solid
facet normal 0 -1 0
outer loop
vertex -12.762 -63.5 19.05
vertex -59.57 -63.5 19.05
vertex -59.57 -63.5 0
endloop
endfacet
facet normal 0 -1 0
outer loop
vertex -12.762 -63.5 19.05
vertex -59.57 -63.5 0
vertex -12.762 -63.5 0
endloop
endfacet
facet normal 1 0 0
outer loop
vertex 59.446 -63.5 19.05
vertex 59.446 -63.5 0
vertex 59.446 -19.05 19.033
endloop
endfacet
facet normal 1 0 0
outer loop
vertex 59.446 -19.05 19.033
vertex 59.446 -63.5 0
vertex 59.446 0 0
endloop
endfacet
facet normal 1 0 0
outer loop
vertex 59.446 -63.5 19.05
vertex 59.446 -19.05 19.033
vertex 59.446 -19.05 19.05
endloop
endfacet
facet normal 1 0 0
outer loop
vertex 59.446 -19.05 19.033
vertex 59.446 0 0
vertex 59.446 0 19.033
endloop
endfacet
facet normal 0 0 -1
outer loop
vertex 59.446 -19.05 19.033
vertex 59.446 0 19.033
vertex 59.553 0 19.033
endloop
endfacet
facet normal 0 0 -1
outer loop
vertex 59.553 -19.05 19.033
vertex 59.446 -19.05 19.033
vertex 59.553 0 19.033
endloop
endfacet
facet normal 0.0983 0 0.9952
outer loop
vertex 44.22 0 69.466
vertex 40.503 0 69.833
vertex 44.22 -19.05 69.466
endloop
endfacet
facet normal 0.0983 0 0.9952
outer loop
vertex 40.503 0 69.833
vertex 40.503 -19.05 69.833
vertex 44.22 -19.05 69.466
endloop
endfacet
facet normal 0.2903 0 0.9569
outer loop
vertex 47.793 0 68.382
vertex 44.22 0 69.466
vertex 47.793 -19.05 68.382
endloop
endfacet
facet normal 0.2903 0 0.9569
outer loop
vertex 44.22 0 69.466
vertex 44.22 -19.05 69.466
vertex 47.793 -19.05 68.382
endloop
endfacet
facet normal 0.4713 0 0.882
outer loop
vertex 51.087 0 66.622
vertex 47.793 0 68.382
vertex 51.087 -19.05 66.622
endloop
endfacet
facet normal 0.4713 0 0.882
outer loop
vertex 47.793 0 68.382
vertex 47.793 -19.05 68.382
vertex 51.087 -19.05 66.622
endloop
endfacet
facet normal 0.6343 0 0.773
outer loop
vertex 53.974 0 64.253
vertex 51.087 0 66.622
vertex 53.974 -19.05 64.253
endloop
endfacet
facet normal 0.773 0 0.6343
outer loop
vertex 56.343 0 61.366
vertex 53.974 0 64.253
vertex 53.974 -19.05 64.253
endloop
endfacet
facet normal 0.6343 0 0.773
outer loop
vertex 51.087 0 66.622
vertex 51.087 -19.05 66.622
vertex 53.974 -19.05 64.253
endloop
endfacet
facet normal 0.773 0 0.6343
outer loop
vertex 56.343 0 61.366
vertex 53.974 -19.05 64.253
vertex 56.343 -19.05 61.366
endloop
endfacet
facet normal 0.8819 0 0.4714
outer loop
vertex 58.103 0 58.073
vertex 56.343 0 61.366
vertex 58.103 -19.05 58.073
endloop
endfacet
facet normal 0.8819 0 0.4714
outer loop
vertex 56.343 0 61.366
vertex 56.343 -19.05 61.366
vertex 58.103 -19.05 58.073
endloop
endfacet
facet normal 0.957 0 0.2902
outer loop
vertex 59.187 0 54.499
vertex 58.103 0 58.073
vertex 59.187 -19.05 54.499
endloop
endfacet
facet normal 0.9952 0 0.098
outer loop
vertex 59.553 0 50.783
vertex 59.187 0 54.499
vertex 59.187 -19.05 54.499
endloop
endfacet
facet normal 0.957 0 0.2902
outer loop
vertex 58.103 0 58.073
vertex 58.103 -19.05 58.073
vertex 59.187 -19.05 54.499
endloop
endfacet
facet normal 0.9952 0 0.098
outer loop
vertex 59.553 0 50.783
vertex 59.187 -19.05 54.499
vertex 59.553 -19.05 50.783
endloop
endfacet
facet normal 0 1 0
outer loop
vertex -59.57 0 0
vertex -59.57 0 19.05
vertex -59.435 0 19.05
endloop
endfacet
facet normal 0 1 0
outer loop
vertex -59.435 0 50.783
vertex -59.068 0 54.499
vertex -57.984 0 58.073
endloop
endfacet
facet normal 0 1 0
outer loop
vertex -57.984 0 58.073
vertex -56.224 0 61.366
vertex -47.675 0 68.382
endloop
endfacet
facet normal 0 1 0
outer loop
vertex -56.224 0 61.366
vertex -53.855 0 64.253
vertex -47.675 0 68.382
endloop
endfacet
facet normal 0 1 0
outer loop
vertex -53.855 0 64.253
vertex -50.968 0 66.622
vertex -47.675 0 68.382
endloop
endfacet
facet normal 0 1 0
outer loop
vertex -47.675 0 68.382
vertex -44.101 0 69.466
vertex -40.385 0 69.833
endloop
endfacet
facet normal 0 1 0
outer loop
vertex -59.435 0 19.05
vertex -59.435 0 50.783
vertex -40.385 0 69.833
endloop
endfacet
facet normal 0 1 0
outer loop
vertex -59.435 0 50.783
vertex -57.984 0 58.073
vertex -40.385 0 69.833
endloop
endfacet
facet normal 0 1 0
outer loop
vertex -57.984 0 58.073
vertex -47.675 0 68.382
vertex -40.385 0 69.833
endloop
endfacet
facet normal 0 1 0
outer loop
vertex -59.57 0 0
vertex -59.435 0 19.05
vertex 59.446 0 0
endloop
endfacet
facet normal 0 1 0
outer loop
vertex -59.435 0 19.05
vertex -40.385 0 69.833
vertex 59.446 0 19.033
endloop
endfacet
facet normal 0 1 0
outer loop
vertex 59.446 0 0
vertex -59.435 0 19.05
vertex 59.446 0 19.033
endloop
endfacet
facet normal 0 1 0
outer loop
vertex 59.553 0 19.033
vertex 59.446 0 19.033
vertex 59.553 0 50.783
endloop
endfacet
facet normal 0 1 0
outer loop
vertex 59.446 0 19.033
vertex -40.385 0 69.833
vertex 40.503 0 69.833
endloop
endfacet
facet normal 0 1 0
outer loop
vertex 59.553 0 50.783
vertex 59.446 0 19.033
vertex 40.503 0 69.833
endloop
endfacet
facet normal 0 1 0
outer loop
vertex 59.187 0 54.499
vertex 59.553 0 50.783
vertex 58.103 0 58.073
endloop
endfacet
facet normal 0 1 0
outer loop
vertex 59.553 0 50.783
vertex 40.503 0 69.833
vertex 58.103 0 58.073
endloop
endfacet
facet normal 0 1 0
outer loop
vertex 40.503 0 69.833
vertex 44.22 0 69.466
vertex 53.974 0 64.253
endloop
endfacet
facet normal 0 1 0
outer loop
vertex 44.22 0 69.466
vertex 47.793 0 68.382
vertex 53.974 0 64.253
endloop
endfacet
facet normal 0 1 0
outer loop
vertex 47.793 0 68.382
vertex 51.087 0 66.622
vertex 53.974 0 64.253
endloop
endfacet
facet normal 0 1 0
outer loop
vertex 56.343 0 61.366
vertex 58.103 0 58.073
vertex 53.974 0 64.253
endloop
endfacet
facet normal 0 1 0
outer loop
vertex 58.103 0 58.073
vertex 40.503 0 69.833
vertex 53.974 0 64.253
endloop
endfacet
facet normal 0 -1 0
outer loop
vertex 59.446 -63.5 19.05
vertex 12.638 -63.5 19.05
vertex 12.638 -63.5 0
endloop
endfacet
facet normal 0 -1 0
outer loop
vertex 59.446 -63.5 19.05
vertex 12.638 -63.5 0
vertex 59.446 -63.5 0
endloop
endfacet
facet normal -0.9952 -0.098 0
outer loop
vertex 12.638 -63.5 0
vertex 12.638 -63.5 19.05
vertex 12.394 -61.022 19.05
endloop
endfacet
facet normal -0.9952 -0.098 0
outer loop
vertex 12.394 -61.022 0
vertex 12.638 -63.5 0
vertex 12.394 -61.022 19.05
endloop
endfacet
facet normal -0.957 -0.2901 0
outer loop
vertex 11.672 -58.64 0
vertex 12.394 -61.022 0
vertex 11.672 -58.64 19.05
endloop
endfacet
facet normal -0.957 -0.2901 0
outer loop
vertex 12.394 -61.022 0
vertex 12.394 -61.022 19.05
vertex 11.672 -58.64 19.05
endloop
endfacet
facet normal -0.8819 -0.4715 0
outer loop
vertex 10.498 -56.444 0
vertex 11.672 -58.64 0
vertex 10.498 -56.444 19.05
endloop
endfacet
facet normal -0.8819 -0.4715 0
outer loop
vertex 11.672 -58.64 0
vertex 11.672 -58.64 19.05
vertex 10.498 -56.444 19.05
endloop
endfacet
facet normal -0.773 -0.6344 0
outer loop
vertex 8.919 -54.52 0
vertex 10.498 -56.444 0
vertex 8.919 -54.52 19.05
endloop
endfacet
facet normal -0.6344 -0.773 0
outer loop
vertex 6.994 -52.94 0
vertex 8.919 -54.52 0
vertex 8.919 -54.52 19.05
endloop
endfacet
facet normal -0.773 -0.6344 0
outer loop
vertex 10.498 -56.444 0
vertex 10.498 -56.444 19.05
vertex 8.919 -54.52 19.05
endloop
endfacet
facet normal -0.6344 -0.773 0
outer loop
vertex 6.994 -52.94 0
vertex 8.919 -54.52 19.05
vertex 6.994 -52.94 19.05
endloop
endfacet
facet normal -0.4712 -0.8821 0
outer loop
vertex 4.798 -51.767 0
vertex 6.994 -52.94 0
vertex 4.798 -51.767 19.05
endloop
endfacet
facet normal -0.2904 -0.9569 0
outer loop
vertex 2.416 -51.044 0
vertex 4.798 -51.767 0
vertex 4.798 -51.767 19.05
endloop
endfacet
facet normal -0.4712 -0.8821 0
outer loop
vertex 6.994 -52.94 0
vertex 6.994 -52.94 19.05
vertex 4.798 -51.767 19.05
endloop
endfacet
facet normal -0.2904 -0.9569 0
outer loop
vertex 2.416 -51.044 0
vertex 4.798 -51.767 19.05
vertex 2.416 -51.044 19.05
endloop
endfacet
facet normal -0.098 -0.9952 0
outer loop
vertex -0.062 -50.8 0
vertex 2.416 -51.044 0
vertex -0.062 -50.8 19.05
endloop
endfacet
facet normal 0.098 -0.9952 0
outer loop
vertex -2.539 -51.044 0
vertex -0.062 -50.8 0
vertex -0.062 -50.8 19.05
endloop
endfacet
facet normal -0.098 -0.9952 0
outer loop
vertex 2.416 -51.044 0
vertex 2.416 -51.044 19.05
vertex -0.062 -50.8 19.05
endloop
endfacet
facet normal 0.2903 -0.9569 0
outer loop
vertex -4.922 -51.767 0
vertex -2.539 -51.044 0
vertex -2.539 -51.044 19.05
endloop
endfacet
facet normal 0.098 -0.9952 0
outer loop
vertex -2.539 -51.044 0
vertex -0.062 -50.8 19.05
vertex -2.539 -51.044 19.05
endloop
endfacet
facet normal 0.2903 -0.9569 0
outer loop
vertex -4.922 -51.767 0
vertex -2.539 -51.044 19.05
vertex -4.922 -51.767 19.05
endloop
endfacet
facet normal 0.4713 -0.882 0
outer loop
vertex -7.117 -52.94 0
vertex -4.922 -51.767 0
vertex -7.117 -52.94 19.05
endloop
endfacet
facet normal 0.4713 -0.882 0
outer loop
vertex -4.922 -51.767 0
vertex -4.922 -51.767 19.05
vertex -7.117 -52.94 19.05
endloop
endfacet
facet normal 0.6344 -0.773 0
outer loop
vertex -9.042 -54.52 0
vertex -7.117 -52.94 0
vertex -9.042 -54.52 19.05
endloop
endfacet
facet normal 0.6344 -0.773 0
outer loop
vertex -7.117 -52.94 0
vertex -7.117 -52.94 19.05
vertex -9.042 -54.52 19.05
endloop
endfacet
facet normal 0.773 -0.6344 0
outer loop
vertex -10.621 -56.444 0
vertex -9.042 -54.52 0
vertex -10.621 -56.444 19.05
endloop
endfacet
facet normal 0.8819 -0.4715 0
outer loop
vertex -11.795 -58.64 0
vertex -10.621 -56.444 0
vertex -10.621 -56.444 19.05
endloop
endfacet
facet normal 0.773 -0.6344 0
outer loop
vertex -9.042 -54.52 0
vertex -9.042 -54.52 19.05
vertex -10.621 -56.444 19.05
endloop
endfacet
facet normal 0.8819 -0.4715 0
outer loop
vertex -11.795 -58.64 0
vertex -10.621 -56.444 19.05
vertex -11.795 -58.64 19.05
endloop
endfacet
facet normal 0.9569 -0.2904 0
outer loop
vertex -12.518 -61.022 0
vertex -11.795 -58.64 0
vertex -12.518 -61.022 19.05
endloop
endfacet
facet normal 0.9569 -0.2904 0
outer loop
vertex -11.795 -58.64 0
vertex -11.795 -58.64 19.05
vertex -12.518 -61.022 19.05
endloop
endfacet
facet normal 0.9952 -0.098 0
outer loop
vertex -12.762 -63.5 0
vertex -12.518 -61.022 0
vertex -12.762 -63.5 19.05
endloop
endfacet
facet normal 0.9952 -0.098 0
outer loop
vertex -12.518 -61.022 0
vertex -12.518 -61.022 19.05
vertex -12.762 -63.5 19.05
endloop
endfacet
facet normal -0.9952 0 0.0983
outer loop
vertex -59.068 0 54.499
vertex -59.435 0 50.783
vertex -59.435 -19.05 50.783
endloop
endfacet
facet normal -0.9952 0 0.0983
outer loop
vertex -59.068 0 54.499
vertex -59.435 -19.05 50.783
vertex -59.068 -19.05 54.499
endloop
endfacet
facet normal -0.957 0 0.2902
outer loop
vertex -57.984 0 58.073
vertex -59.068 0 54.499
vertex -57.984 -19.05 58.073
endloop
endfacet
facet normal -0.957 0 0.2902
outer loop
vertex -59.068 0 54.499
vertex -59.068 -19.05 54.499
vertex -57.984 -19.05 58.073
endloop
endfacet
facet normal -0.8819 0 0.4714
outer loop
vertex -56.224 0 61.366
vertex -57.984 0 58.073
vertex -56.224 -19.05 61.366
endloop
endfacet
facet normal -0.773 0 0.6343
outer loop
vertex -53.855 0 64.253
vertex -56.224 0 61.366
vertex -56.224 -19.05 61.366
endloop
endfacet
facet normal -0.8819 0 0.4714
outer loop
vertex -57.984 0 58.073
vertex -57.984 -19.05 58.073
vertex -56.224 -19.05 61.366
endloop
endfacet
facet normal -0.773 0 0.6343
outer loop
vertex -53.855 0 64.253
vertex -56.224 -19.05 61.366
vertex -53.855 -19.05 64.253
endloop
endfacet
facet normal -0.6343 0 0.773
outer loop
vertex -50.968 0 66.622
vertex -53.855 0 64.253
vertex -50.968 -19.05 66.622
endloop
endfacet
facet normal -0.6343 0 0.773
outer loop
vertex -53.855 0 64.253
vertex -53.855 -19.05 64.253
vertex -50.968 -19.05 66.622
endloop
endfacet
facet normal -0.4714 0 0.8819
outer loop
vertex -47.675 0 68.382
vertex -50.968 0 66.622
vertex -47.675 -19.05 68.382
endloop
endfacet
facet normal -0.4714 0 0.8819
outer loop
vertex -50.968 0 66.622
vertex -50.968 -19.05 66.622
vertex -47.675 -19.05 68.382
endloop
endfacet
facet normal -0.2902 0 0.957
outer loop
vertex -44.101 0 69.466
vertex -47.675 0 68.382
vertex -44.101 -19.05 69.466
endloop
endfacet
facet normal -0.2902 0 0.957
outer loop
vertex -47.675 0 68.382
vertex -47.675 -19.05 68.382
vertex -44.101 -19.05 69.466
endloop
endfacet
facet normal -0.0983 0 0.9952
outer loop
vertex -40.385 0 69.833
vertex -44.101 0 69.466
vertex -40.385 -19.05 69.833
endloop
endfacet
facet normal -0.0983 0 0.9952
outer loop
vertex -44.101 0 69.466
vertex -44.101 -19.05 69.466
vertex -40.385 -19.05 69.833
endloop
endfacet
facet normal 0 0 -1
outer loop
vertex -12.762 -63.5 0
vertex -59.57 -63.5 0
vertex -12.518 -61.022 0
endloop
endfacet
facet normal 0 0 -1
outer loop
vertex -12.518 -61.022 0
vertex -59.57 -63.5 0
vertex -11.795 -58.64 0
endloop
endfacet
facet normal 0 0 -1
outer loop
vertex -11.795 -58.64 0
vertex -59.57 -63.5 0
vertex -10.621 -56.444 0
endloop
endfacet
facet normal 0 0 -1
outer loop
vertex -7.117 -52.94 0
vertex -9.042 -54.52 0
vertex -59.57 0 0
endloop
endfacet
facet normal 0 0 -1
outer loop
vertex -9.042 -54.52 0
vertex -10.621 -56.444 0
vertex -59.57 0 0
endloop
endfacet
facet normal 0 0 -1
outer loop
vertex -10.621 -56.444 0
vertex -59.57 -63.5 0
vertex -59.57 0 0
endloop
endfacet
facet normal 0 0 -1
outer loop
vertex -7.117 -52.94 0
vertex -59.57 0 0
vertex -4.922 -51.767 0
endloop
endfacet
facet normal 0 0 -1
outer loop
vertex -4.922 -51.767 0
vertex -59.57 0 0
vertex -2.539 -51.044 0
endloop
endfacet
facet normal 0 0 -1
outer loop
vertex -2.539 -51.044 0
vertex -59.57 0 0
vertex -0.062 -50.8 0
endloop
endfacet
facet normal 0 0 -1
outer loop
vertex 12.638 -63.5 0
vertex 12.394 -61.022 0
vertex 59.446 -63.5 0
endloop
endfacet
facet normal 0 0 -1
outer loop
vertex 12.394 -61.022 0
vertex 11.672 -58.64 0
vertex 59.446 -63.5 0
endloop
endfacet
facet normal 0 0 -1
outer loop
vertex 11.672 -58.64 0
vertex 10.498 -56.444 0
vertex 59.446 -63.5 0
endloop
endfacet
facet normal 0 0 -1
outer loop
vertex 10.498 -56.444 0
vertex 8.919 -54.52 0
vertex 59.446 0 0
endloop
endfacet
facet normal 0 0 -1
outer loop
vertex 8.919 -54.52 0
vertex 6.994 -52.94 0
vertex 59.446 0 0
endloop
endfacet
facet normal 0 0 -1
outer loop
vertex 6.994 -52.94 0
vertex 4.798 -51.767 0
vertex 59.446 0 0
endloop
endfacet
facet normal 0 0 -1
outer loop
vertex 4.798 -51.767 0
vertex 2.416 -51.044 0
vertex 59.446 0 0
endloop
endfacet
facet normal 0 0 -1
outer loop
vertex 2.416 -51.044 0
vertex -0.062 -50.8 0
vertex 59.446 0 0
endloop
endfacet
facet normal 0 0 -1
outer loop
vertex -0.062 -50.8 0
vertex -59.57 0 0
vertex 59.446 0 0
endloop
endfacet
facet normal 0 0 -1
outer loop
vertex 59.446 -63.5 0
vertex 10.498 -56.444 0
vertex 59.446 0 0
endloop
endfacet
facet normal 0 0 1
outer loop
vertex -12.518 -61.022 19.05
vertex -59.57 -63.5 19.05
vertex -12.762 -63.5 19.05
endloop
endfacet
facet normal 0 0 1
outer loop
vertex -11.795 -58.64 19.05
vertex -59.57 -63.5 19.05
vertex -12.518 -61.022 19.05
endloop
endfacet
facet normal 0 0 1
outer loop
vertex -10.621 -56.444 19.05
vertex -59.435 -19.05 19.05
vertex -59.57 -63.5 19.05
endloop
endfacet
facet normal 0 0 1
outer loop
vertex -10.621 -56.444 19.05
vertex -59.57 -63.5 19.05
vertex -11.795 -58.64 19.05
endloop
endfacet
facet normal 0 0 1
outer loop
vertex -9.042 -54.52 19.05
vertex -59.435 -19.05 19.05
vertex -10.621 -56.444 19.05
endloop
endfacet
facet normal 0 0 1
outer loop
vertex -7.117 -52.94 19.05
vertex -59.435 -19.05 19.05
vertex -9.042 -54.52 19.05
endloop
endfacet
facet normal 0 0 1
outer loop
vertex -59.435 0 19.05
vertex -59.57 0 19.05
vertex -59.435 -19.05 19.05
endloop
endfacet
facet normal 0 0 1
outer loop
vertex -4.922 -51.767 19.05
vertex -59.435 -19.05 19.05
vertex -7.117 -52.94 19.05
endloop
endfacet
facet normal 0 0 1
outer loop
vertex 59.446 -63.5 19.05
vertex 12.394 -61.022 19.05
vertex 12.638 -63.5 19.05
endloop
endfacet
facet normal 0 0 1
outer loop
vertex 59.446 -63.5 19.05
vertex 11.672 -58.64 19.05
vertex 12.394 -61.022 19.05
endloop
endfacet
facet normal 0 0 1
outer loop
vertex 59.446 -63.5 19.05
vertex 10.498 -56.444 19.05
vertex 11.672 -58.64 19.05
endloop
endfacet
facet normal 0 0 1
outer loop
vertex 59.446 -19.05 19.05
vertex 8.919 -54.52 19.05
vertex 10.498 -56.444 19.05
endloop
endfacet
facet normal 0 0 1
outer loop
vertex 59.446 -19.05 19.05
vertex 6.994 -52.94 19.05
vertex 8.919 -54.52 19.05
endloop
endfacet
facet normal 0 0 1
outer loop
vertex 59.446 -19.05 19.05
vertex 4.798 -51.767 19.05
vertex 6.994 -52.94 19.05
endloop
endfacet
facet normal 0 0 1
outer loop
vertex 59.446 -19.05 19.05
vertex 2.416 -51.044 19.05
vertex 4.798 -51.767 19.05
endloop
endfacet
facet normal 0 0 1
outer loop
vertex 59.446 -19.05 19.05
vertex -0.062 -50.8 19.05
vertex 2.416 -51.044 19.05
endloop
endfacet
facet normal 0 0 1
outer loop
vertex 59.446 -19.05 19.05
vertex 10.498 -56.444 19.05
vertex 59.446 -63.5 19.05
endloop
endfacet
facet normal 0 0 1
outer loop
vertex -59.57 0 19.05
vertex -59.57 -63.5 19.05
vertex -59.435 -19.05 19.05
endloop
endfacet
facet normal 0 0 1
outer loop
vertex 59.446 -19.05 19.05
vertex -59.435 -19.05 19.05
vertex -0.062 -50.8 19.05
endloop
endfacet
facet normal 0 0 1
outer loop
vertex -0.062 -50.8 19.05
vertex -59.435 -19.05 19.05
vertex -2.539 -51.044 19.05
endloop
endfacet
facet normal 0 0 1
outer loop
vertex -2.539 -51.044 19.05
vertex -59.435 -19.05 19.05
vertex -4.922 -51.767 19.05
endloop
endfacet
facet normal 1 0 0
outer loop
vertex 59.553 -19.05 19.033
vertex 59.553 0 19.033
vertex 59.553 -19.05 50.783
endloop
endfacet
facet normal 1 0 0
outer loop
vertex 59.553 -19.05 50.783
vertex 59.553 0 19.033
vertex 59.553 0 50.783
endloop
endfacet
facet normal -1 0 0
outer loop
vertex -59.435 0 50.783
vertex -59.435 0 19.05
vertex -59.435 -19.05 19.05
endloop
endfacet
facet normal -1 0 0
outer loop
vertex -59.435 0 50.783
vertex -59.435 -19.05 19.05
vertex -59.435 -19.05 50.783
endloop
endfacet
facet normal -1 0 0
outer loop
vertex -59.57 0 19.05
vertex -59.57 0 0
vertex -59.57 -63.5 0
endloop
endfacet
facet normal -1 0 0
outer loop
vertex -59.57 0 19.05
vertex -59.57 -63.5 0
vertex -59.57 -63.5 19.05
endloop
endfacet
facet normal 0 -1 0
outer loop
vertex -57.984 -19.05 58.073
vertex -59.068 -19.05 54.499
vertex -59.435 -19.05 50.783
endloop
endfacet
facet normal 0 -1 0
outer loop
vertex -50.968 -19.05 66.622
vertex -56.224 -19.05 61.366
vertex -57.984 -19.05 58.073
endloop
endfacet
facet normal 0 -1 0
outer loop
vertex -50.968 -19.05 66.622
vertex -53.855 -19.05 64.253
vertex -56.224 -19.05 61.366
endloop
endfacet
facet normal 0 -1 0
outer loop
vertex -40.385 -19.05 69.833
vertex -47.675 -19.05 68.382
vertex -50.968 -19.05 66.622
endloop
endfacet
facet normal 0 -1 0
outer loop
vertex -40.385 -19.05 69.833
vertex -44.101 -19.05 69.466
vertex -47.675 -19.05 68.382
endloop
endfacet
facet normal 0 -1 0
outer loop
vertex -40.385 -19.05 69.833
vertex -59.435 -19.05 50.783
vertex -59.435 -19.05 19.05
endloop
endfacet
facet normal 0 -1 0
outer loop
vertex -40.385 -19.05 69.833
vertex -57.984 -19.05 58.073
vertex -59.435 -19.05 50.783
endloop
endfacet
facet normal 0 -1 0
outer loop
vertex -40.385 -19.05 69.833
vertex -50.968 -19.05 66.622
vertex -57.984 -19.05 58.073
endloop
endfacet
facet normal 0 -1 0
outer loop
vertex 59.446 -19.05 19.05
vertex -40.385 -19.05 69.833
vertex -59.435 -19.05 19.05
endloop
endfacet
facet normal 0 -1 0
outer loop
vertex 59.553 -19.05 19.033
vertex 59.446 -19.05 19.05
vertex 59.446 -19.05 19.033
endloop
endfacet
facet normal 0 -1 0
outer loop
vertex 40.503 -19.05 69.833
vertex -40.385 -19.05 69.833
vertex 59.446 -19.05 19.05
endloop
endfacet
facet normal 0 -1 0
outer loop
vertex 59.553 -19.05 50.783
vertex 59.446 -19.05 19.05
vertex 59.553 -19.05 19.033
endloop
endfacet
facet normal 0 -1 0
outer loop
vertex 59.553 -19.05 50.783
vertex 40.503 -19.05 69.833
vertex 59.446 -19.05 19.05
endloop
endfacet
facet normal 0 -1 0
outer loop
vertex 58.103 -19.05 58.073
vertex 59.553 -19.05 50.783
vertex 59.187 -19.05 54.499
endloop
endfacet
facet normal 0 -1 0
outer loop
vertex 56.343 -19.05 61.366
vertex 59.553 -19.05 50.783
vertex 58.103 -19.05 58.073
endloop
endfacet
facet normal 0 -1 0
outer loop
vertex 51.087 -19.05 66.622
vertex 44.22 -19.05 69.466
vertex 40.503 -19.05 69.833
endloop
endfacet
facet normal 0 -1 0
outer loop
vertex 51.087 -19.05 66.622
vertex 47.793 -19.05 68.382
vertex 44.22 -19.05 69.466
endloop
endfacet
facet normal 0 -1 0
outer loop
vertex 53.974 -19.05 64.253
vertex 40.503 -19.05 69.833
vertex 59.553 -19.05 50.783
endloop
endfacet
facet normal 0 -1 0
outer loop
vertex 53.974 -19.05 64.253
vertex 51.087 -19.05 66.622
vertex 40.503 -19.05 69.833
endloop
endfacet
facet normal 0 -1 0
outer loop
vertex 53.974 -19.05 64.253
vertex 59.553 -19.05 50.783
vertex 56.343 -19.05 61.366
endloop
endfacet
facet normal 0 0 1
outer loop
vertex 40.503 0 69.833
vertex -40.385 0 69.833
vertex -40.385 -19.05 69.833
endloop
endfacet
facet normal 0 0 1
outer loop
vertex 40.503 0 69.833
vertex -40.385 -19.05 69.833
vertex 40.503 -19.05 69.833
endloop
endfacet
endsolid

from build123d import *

# Parameters (mm, degrees)
F0_W     = 119.0162692178
F0_H     = 19.05
F1_DEPTH = 63.5
F2_W     = 118.98781716
F2_H     = 50.8
F3_DEPTH = 19.05
F5_DEPTH = 25.4
F6_R     = 19.05
F7_R     = 19.05


with BuildPart() as f1:
    # F0 (on Front) → F1 (new body)
    with BuildSketch(Plane.XZ):
        with Locations((-0.0617158565, 9.525)):
            Rectangle(F0_W, F0_H)
    extrude(amount=F1_DEPTH)

    # F2 (on Front) → F3 (join)
    with BuildSketch(Plane.XZ):
        with Locations((0.0594016165, 44.4325357676)):
            Rectangle(F2_W, F2_H)
    extrude(amount=F3_DEPTH)

    # F4 (on face) → F5 (cut)
    with BuildSketch(Plane.XY.offset(19.05)):
        with BuildLine():
            Line((-12.7617158565, -63.5), (12.6382841435, -63.5))
            ThreePointArc((12.6382841435, -63.5), (-0.0617158565, -50.8), (-12.7617158565, -63.5))
        make_face()
    extrude(amount=-F5_DEPTH, mode=Mode.SUBTRACT)

    # F6
    f6_edges = [f1.edges().sort_by_distance(p)[0] for p in [
        (-59.434507, -9.525, 69.832536),
    ]]
    fillet(f6_edges, radius=F6_R)

    # F7
    f7_edges = [f1.edges().sort_by_distance(p)[0] for p in [
        (59.55331, -9.525, 69.832536),
    ]]
    fillet(f7_edges, radius=F7_R)


solid = f1.part
